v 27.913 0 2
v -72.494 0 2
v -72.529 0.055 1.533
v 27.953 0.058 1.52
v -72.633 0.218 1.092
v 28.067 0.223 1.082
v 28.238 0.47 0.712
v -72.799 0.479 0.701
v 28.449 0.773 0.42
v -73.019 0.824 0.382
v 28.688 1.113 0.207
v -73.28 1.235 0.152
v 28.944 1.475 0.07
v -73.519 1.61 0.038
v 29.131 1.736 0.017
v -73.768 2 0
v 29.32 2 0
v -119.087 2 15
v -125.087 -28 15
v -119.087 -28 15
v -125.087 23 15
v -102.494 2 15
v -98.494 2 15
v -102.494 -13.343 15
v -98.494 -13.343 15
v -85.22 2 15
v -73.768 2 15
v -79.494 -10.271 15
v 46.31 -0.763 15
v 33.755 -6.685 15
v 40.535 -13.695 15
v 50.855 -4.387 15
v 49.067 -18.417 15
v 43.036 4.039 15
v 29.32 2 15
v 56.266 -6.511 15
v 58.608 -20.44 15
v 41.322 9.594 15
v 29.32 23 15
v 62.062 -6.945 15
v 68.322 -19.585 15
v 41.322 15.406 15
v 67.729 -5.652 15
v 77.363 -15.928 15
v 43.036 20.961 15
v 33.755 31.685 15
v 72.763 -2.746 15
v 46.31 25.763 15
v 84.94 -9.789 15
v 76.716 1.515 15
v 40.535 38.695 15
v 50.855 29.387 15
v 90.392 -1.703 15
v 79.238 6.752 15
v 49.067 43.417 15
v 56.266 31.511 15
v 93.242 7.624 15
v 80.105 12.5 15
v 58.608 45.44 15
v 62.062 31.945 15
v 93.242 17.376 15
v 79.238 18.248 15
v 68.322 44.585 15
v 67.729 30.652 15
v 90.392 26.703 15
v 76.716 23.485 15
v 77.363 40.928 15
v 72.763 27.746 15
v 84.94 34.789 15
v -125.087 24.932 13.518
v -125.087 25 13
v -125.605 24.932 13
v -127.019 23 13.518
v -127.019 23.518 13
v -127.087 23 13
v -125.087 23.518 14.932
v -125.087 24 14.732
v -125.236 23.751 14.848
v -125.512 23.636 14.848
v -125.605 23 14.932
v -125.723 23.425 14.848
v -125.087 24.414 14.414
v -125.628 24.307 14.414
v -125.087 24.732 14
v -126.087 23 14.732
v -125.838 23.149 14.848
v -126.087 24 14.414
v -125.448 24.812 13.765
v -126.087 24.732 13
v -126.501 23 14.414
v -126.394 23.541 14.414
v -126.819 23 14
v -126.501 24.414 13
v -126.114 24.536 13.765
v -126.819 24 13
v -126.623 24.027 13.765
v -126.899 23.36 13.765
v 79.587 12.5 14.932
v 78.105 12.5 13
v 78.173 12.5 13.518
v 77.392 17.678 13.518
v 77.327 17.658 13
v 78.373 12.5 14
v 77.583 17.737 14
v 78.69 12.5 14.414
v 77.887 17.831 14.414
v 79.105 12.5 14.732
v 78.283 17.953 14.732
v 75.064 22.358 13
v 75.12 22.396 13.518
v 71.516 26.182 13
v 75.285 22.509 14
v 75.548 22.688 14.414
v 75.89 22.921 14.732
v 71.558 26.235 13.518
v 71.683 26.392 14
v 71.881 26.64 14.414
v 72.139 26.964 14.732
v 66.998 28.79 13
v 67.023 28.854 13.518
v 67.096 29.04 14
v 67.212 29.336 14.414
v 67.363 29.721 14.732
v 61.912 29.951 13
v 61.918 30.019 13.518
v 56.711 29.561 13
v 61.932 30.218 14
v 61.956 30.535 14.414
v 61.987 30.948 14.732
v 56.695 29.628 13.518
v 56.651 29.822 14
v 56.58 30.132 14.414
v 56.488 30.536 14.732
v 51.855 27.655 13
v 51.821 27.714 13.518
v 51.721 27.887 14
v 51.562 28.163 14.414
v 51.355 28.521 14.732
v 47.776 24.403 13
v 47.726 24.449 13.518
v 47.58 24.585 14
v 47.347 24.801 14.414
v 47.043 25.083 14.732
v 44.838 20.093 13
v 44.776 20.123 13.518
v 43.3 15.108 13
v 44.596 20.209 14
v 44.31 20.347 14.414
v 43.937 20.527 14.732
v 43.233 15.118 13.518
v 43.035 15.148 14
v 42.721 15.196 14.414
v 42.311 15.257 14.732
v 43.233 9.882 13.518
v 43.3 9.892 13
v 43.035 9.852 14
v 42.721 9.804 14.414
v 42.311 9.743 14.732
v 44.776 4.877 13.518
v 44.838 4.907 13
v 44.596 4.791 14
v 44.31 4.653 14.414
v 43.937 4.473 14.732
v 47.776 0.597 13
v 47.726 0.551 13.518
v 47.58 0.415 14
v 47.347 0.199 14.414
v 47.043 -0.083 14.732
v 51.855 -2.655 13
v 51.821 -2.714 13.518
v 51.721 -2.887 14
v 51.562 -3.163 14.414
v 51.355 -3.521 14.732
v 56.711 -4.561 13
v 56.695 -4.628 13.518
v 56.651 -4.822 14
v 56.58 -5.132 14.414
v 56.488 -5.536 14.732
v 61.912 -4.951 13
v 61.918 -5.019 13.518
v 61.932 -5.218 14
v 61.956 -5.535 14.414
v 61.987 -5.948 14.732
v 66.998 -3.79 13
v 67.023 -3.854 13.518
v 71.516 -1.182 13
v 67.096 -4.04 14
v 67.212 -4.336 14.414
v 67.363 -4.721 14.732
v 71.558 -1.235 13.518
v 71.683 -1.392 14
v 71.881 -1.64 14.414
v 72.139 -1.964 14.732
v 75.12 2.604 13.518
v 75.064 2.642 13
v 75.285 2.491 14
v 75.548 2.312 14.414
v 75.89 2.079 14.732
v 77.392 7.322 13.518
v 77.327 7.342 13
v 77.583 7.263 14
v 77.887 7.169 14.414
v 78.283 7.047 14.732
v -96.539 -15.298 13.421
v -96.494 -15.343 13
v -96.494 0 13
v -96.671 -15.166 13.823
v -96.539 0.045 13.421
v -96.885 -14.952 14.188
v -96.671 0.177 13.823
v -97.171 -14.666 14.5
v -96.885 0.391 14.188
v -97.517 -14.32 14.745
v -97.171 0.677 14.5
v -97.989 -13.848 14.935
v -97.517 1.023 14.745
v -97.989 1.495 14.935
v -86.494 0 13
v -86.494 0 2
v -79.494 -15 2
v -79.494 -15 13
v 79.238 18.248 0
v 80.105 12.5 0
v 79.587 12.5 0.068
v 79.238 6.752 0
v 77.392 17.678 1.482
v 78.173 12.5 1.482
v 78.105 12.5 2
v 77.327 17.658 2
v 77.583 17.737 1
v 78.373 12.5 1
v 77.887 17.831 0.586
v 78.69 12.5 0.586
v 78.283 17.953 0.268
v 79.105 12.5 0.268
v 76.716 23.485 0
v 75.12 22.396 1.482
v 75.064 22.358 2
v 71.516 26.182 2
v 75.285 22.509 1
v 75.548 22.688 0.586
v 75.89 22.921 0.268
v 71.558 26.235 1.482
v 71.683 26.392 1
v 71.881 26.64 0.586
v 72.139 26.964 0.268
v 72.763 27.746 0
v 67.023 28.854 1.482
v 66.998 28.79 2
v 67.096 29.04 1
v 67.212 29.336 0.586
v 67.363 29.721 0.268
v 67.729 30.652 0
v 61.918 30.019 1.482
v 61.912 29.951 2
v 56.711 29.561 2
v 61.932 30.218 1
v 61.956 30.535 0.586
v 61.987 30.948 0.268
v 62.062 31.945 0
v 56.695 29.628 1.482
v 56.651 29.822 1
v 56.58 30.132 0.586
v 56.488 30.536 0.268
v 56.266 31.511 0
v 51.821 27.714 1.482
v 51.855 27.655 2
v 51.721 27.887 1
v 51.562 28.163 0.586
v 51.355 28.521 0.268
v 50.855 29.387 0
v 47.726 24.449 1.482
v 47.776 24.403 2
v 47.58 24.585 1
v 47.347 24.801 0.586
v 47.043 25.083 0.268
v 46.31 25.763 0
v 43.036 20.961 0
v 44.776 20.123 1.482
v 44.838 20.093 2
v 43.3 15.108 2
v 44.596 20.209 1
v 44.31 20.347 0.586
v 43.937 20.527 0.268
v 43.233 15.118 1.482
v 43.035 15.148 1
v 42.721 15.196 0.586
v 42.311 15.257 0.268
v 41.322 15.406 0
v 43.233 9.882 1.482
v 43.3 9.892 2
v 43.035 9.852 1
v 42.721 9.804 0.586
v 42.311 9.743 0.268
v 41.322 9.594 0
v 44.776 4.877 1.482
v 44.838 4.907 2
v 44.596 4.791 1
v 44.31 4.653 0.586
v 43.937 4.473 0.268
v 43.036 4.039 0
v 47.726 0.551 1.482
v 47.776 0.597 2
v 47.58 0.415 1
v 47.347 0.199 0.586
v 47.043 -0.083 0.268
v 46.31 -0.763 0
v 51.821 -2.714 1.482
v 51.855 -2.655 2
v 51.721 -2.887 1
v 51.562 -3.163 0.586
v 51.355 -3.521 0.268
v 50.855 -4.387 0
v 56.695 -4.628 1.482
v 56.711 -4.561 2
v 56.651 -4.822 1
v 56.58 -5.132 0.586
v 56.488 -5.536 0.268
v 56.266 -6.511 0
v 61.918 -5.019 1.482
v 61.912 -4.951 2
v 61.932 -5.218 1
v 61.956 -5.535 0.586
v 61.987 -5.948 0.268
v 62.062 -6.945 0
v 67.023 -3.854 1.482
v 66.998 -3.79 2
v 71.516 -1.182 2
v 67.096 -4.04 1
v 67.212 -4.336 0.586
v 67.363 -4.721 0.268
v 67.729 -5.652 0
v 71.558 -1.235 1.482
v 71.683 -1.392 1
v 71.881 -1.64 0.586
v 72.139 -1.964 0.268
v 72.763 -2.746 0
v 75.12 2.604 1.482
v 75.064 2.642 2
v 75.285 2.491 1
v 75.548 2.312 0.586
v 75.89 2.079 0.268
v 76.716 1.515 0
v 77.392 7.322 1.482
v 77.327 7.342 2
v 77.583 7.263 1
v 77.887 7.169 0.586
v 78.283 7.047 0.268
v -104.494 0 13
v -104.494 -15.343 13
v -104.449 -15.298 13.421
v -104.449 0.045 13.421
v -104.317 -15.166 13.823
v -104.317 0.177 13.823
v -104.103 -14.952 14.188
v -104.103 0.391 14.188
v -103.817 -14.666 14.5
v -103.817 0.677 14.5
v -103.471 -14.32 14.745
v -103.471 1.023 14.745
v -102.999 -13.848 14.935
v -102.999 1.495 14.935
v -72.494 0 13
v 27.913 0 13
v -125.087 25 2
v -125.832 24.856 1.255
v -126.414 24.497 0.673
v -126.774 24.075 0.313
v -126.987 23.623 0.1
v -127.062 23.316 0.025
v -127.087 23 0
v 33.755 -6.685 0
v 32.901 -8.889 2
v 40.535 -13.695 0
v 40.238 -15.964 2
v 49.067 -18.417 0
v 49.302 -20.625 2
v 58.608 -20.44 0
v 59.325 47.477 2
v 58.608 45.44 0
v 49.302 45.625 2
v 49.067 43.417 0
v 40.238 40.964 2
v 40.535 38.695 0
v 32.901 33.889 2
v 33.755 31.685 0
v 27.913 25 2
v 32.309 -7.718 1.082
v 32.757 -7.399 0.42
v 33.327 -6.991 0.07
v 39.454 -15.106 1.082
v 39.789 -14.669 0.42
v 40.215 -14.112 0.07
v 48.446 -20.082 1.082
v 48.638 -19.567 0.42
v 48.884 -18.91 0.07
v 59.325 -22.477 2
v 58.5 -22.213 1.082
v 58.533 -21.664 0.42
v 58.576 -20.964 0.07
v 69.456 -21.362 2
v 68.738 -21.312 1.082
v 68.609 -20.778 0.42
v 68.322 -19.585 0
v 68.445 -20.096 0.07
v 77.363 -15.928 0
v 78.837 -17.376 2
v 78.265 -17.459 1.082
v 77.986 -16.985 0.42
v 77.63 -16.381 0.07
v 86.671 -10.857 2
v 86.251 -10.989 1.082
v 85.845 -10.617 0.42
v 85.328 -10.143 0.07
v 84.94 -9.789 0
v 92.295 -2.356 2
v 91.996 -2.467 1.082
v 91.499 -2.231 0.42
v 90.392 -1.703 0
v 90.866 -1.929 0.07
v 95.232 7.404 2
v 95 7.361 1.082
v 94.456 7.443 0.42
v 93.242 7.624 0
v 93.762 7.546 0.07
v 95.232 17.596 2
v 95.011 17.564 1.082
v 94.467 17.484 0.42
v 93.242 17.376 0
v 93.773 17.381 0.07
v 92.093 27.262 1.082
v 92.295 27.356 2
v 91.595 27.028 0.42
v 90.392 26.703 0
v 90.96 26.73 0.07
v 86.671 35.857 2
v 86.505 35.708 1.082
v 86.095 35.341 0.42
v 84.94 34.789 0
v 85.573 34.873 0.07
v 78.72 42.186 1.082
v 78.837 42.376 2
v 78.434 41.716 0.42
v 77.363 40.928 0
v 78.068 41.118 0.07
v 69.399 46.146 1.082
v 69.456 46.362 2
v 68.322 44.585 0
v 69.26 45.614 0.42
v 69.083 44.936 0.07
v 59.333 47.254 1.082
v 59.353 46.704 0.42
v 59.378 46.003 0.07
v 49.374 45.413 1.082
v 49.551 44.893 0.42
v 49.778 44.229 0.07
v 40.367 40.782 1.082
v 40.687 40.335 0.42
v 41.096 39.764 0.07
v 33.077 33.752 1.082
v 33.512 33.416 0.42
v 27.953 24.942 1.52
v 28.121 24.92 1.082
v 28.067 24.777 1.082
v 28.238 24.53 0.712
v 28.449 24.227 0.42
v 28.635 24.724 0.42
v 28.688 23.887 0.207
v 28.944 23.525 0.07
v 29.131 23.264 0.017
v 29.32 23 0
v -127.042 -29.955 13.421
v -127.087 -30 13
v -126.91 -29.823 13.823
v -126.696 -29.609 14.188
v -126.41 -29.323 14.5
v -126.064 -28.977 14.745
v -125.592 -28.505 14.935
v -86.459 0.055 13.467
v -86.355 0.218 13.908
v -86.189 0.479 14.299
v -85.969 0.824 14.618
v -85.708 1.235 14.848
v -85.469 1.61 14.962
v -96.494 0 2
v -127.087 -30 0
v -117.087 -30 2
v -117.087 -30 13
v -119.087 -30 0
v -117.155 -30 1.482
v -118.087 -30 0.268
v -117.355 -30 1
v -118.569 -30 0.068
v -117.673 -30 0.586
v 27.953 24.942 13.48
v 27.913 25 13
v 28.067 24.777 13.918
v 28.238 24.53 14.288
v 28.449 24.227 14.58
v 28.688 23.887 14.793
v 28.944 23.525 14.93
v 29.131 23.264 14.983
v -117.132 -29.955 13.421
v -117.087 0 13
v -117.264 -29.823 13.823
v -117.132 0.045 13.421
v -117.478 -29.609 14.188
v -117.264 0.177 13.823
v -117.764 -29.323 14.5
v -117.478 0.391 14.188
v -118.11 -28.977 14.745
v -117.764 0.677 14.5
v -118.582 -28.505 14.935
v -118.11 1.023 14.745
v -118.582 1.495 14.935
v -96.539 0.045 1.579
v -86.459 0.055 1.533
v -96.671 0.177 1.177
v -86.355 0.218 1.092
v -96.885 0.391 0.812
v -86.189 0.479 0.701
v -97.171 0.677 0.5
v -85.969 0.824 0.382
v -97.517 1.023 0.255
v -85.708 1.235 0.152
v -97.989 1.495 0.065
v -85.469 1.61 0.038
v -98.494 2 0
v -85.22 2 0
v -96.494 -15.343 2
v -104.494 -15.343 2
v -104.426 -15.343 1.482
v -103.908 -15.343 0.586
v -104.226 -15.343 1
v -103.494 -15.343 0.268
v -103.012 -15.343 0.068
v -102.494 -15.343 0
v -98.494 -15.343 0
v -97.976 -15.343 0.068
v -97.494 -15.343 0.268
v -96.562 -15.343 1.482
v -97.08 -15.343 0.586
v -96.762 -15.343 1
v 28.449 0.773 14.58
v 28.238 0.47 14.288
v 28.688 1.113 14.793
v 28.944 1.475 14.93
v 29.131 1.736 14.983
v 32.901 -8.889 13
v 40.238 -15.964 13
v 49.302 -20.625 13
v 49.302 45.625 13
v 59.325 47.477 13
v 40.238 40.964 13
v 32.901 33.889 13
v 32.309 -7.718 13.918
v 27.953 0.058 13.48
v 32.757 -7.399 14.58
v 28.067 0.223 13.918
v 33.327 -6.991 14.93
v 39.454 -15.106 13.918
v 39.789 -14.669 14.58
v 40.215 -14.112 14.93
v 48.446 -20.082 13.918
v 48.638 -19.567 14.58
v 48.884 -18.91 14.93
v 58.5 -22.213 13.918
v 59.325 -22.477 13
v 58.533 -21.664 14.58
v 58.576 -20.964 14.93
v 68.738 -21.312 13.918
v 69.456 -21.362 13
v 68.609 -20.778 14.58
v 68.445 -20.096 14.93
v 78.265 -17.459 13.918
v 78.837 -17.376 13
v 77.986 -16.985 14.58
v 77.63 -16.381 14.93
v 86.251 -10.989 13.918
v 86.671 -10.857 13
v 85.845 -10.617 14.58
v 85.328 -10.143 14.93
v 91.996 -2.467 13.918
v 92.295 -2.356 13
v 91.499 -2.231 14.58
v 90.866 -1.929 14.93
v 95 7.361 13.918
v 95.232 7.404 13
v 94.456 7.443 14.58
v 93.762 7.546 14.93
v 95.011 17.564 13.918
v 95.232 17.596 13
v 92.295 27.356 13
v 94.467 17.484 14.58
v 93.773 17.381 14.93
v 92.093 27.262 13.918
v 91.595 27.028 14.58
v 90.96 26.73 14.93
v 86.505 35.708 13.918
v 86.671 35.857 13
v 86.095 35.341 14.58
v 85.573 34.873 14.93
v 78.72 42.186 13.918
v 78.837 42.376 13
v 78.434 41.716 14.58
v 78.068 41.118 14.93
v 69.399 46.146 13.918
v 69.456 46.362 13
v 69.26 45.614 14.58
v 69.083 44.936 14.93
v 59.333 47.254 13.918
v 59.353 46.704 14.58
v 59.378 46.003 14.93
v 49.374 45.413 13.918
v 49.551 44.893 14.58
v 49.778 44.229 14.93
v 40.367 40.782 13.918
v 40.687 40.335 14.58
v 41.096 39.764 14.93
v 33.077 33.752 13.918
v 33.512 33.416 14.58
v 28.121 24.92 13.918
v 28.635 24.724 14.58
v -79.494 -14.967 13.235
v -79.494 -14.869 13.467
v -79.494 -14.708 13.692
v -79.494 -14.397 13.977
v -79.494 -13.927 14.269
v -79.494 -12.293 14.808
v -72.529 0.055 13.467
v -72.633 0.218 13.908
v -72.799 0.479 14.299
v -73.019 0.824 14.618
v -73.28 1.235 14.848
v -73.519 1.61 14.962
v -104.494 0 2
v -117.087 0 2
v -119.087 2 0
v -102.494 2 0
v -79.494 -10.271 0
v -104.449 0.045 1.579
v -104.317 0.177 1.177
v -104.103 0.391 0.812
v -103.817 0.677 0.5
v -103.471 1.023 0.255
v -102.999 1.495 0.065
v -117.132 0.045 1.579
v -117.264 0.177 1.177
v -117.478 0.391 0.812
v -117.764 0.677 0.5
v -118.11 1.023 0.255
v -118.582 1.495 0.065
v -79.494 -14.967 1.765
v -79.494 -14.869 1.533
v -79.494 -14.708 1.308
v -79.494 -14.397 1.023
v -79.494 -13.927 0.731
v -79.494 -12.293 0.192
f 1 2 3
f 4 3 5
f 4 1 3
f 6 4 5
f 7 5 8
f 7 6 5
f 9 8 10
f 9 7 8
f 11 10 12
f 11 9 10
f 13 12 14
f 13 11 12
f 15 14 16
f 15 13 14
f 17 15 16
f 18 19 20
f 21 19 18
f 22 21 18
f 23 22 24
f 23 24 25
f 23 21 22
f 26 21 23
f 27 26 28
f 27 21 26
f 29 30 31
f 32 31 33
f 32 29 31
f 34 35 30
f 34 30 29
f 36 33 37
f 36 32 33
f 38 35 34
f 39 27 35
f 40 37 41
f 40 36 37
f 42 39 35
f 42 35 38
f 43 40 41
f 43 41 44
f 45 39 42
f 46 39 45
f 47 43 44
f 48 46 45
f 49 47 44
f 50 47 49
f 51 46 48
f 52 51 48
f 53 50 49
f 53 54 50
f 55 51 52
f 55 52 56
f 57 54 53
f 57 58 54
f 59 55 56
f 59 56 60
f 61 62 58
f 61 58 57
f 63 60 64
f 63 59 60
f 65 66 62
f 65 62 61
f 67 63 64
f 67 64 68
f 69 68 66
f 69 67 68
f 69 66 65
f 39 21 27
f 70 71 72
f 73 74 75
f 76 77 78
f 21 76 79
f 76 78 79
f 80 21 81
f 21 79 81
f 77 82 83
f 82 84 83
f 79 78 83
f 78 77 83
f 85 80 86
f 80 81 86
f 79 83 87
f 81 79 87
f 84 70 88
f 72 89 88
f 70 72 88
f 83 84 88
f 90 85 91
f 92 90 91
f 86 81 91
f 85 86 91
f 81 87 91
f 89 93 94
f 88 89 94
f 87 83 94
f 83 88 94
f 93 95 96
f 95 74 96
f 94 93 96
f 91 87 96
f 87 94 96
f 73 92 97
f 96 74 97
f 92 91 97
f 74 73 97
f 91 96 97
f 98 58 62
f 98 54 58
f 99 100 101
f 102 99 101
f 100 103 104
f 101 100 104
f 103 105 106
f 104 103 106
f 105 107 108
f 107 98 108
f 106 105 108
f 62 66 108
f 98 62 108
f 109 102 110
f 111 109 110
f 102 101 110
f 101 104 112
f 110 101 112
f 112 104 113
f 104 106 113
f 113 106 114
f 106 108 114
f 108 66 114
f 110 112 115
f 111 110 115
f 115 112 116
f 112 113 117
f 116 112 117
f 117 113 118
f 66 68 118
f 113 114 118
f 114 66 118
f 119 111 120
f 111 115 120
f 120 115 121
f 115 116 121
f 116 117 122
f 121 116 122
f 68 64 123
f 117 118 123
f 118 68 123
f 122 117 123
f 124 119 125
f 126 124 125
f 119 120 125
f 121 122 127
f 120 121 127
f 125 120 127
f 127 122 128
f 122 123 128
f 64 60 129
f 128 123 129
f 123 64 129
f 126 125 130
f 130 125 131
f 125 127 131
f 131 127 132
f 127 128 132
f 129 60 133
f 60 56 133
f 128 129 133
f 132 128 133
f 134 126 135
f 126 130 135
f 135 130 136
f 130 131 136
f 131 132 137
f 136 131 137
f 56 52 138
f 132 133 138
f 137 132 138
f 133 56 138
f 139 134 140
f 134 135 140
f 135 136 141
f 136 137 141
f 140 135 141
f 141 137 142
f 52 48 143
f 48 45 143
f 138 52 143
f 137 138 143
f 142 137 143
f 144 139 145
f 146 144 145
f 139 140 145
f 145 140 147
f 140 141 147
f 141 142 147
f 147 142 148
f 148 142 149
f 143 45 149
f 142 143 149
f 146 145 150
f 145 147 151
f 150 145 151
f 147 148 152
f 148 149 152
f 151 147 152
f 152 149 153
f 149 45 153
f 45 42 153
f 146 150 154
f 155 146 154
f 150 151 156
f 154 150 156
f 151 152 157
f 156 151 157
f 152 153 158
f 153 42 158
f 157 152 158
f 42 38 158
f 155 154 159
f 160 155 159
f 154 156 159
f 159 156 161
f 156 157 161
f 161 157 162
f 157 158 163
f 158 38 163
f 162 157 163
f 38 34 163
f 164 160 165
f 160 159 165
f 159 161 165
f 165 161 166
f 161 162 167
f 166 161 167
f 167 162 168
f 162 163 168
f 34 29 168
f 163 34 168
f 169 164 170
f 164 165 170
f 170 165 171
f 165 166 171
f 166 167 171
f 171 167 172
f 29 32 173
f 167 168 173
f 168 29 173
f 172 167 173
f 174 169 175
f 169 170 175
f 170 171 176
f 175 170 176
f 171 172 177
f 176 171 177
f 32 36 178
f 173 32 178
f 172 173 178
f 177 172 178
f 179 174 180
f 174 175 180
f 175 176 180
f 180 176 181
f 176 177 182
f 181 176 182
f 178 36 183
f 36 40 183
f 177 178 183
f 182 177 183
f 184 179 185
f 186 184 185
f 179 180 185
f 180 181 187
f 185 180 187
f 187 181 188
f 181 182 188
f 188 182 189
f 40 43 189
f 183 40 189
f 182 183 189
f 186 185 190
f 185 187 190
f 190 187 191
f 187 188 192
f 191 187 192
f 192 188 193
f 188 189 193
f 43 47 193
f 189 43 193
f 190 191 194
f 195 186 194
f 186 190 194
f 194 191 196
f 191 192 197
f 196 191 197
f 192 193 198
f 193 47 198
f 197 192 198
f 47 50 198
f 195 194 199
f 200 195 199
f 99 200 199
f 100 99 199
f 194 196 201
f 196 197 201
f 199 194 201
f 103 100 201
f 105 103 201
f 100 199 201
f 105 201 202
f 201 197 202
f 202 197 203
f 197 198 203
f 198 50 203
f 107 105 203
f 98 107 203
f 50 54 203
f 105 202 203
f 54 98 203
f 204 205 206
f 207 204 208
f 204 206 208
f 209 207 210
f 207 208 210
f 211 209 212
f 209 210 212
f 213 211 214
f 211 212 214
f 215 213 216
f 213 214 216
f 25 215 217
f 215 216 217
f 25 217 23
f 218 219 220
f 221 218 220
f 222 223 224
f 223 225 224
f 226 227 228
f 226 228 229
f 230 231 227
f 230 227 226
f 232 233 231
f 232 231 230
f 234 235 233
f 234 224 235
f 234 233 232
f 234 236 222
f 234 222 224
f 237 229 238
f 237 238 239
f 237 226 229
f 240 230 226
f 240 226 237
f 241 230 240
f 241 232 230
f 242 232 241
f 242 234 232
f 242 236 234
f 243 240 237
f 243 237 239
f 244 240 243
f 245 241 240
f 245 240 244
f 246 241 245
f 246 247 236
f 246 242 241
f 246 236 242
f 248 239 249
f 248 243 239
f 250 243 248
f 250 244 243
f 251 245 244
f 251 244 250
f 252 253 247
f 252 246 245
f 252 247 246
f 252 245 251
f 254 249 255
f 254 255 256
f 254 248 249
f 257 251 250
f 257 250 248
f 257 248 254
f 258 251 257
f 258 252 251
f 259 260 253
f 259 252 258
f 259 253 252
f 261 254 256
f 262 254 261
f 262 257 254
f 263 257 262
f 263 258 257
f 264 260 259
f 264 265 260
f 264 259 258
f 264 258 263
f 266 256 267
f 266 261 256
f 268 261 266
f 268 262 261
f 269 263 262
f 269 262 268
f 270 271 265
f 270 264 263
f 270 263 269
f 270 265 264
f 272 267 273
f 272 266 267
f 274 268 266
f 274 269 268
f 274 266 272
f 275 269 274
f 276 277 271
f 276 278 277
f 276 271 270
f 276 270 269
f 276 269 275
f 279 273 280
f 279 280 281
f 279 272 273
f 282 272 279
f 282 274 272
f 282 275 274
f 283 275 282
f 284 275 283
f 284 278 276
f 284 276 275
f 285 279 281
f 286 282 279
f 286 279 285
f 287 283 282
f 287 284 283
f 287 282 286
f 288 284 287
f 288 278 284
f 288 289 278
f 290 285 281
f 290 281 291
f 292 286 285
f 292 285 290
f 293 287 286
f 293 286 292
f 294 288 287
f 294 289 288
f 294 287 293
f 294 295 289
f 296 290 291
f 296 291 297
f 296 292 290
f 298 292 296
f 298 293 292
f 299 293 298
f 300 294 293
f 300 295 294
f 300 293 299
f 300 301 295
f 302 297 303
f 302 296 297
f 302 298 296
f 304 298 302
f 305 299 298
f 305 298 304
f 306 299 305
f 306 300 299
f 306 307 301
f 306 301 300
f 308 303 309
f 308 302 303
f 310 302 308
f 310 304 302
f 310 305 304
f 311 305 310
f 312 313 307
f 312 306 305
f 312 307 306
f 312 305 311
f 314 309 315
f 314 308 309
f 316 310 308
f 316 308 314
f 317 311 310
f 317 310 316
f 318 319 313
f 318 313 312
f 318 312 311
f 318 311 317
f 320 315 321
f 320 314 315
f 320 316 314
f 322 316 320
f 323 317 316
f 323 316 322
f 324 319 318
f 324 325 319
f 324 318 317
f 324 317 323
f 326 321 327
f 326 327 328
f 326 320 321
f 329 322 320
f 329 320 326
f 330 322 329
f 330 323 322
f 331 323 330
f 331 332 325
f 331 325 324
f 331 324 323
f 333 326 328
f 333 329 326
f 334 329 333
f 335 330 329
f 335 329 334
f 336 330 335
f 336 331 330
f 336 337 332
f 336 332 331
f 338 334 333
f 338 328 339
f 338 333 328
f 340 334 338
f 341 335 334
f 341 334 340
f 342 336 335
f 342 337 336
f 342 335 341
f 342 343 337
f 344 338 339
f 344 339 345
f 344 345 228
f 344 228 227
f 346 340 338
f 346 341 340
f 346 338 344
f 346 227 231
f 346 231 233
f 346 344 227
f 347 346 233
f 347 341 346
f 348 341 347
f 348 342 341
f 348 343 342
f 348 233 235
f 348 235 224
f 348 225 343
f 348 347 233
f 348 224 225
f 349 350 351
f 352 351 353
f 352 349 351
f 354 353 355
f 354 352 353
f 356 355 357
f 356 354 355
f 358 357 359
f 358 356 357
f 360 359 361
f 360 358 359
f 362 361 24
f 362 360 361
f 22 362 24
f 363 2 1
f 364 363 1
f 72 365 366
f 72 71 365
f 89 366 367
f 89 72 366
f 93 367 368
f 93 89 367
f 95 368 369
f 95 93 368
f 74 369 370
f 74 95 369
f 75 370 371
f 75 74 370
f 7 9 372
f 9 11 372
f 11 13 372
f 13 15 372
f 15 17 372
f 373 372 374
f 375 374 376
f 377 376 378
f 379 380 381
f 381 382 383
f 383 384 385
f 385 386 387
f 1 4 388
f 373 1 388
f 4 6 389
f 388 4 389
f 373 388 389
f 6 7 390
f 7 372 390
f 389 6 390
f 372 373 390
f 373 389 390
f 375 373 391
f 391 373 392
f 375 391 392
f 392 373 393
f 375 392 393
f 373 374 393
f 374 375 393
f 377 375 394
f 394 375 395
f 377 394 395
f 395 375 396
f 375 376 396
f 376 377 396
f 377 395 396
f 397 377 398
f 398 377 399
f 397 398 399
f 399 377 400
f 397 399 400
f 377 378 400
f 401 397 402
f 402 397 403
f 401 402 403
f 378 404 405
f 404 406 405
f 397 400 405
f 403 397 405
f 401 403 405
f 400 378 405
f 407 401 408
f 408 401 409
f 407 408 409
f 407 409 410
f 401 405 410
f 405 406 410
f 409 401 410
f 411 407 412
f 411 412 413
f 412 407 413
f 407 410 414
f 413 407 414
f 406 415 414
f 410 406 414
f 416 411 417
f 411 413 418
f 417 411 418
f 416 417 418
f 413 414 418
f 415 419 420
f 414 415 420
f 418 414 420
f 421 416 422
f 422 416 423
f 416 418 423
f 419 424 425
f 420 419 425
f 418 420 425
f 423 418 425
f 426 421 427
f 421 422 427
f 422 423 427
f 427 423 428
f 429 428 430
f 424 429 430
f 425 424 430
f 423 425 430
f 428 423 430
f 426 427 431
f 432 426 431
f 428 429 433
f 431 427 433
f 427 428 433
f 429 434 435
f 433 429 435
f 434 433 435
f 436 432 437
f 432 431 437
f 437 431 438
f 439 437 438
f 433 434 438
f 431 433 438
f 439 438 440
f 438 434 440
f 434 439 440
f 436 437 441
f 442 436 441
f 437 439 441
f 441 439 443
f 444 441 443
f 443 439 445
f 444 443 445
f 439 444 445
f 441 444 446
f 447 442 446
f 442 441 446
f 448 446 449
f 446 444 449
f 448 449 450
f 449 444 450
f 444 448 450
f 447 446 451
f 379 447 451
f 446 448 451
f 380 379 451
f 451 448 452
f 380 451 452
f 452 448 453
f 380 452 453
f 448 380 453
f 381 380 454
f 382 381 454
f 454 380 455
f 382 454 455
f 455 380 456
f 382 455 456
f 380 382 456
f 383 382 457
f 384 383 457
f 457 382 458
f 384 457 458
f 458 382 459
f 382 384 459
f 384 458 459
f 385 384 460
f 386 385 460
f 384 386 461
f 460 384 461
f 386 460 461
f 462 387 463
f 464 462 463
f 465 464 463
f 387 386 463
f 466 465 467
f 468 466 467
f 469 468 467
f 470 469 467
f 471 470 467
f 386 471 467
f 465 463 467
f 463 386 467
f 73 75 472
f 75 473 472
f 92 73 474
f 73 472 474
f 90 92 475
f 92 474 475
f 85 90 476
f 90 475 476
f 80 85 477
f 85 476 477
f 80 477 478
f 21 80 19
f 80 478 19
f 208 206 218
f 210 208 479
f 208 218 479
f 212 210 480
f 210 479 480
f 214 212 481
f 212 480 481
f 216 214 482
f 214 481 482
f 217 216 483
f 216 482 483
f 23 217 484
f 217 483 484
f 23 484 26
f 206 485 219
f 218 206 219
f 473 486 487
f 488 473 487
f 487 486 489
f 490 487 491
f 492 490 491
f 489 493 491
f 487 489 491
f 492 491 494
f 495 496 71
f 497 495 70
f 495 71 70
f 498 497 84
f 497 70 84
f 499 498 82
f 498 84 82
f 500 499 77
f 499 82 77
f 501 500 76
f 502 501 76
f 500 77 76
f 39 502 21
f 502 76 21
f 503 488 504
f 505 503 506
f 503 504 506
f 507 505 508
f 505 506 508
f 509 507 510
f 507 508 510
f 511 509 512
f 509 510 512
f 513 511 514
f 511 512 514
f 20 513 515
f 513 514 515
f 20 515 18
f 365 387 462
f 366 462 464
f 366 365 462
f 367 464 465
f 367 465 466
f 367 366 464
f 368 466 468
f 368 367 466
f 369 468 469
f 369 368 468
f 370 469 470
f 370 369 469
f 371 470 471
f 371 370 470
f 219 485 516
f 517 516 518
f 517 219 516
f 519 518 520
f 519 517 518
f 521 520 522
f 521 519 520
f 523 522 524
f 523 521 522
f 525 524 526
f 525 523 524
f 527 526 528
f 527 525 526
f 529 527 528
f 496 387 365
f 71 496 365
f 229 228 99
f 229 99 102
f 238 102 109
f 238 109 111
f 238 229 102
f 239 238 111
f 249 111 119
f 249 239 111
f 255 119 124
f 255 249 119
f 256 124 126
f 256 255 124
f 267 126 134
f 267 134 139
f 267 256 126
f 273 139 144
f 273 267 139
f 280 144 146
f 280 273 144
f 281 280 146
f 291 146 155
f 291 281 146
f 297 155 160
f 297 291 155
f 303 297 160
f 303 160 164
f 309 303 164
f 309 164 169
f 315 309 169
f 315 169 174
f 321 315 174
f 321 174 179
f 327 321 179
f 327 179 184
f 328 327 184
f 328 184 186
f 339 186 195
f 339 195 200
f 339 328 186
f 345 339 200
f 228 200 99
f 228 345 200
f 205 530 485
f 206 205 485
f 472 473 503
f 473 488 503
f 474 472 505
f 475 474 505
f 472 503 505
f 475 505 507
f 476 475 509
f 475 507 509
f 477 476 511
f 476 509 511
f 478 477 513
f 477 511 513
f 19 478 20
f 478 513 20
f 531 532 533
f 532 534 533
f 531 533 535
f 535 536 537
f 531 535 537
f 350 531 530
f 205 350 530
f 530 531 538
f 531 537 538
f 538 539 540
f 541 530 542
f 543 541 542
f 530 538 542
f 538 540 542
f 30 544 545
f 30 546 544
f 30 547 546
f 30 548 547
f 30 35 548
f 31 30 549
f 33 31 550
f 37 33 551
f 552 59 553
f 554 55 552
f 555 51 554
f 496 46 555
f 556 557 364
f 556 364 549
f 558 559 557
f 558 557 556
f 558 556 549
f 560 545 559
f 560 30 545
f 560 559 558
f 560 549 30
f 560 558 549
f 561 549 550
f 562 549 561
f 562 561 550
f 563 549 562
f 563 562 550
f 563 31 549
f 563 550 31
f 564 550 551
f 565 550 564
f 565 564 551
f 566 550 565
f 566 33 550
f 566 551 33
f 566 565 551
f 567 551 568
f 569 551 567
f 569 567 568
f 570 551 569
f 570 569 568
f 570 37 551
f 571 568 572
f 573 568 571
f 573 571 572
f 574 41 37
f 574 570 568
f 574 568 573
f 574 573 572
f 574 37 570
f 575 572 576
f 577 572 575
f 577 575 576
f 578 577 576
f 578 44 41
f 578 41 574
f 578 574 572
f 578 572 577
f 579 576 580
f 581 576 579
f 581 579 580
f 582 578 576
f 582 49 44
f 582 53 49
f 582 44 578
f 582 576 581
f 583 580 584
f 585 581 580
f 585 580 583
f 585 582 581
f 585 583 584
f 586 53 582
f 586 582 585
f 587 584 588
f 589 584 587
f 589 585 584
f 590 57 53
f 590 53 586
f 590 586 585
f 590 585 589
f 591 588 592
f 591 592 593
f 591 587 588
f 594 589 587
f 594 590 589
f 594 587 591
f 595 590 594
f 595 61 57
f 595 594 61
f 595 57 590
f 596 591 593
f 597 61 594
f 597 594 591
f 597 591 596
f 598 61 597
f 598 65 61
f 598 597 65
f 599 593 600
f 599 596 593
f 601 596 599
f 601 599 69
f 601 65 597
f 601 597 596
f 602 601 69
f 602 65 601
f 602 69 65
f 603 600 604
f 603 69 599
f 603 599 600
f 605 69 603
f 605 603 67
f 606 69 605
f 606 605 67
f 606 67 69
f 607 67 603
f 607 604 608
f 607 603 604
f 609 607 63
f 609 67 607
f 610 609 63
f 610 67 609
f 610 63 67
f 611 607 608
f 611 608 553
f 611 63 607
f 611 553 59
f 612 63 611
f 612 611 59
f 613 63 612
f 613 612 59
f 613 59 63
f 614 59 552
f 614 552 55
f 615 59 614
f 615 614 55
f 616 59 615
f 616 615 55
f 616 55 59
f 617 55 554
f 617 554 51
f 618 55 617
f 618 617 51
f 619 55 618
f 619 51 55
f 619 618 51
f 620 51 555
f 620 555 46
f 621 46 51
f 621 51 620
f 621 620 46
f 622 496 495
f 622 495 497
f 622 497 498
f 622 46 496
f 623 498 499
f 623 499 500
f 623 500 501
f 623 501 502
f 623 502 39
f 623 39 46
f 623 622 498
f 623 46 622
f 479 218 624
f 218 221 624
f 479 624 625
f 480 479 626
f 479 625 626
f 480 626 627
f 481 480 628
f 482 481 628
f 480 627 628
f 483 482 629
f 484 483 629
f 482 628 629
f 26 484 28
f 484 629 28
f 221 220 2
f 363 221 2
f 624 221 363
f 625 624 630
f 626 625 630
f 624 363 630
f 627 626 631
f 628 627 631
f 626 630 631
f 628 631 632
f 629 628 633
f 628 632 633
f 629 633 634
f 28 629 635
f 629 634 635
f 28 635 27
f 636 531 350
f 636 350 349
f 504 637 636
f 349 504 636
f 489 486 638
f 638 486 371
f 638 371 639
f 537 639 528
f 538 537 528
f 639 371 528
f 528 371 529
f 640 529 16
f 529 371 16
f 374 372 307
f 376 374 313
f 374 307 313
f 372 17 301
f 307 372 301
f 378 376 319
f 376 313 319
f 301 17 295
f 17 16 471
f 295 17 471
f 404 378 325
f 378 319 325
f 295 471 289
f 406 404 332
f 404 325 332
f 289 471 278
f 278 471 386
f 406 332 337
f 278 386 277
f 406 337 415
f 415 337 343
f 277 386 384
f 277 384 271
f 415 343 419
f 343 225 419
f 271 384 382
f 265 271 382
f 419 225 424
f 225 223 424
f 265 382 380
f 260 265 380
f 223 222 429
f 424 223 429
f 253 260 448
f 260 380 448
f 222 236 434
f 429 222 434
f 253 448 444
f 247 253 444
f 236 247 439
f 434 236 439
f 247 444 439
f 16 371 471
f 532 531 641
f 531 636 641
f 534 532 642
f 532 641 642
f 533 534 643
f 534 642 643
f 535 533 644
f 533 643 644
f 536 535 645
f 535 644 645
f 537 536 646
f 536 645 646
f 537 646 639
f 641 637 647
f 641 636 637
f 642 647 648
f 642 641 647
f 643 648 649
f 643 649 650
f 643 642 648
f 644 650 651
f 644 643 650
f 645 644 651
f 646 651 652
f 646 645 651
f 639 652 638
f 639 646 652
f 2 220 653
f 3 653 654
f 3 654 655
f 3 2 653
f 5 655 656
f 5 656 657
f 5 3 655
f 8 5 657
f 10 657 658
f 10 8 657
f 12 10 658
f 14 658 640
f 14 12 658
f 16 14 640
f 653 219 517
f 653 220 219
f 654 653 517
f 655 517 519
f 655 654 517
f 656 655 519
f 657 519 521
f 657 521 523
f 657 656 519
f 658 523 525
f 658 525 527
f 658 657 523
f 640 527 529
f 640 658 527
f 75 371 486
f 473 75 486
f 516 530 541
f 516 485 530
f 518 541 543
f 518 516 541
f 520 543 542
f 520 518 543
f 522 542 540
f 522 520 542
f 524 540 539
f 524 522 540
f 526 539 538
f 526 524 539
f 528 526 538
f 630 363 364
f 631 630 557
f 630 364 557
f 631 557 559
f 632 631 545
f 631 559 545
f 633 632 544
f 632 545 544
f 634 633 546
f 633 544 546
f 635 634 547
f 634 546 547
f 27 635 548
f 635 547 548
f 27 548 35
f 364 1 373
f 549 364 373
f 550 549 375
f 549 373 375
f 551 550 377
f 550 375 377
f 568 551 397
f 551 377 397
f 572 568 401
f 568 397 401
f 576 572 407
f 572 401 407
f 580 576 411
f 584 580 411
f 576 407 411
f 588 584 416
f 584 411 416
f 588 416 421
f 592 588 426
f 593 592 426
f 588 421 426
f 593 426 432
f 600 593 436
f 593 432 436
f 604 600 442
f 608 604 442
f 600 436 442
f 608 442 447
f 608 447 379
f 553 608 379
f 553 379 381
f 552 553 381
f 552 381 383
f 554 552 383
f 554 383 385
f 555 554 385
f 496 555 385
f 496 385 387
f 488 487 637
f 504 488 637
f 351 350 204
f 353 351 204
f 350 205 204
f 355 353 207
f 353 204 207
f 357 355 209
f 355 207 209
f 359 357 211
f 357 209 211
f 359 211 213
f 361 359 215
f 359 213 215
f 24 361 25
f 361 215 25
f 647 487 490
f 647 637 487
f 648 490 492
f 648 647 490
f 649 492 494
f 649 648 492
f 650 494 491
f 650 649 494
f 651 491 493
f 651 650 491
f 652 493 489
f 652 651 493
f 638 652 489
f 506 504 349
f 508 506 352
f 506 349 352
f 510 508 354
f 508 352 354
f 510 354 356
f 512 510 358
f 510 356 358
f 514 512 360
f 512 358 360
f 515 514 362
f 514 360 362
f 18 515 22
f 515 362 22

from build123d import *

# Parameters (mm, degrees)
F0_R     = 17.5
F0_W     = 8
F0_H     = 15.3430486098
F0_W_2   = 10
F0_H_2   = 30
F1_DEPTH = 15
F2_R     = 2


with BuildPart() as f1:
    # F0 (on Top) → F1 (new body)
    with BuildSketch(Plane.XY):
        with BuildLine():
            ThreePointArc((27.9129424838, 0), (95.6046845604, 12.5), (27.9129424838, 25))
            Line((27.9129424838, 25), (-127.0870575162, 25))
            Line((-127.0870575162, 25), (-127.0870575162, 0))
            Line((-127.0870575162, 0), (-117.0870575162, 0))
            Line((-117.0870575162, 0), (-104.4938835184, 0))
            Line((-104.4938835184, 0), (-96.4938835184, 0))
            Line((-96.4938835184, 0), (-86.4938835184, 0))
            Line((-86.4938835184, 0), (-72.4938835184, 0))
            Line((-72.4938835184, 0), (27.9129424838, 0))
        make_face()
        with Locations((60.6046845604, 12.5)):
            Circle(F0_R, mode=Mode.SUBTRACT)
        Polygon((-79.4938835184, -15.0000602999), (-72.4938835184, 0), (-86.4938835184, 0), align=None)
        with Locations((-100.4938835184, -7.6715243049)):
            Rectangle(F0_W, F0_H)
        with Locations((-122.0870575162, -15)):
            Rectangle(F0_W_2, F0_H_2)
    extrude(amount=F1_DEPTH)

    # F2
    f2_edges = [f1.edges().sort_by_distance(p)[0] for p in [
        (-127.087058, 25, 7.5),
        (-122.087058, -30, 15),
        (-100.493884, -15.343049, 15),
        (-82.993884, -7.50003, 15),
        (-75.993884, -7.50003, 15),
        (95.604685, 12.5, 15),
        (95.604685, 12.5, 0),
        (43.104685, 12.5, 0),
        (43.104685, 12.5, 15),
        (-49.587058, 25, 15),
        (-49.587058, 25, 0),
        (-22.290471, 0, 15),
        (-110.790471, 0, 15),
        (-91.493884, 0, 15),
        (-117.087058, -15, 15),
        (-127.087058, -2.5, 15),
        (-96.493884, -7.671524, 15),
        (-104.493884, -7.671524, 15),
        (-22.290471, 0, 0),
        (-82.993884, -7.50003, 0),
        (-75.993884, -7.50003, 0),
        (-91.493884, 0, 0),
        (-96.493884, -7.671524, 0),
        (-104.493884, -7.671524, 0),
        (-110.790471, 0, 0),
        (-117.087058, -15, 0),
    ]]
    fillet(f2_edges, radius=F2_R)


solid = f1.part
